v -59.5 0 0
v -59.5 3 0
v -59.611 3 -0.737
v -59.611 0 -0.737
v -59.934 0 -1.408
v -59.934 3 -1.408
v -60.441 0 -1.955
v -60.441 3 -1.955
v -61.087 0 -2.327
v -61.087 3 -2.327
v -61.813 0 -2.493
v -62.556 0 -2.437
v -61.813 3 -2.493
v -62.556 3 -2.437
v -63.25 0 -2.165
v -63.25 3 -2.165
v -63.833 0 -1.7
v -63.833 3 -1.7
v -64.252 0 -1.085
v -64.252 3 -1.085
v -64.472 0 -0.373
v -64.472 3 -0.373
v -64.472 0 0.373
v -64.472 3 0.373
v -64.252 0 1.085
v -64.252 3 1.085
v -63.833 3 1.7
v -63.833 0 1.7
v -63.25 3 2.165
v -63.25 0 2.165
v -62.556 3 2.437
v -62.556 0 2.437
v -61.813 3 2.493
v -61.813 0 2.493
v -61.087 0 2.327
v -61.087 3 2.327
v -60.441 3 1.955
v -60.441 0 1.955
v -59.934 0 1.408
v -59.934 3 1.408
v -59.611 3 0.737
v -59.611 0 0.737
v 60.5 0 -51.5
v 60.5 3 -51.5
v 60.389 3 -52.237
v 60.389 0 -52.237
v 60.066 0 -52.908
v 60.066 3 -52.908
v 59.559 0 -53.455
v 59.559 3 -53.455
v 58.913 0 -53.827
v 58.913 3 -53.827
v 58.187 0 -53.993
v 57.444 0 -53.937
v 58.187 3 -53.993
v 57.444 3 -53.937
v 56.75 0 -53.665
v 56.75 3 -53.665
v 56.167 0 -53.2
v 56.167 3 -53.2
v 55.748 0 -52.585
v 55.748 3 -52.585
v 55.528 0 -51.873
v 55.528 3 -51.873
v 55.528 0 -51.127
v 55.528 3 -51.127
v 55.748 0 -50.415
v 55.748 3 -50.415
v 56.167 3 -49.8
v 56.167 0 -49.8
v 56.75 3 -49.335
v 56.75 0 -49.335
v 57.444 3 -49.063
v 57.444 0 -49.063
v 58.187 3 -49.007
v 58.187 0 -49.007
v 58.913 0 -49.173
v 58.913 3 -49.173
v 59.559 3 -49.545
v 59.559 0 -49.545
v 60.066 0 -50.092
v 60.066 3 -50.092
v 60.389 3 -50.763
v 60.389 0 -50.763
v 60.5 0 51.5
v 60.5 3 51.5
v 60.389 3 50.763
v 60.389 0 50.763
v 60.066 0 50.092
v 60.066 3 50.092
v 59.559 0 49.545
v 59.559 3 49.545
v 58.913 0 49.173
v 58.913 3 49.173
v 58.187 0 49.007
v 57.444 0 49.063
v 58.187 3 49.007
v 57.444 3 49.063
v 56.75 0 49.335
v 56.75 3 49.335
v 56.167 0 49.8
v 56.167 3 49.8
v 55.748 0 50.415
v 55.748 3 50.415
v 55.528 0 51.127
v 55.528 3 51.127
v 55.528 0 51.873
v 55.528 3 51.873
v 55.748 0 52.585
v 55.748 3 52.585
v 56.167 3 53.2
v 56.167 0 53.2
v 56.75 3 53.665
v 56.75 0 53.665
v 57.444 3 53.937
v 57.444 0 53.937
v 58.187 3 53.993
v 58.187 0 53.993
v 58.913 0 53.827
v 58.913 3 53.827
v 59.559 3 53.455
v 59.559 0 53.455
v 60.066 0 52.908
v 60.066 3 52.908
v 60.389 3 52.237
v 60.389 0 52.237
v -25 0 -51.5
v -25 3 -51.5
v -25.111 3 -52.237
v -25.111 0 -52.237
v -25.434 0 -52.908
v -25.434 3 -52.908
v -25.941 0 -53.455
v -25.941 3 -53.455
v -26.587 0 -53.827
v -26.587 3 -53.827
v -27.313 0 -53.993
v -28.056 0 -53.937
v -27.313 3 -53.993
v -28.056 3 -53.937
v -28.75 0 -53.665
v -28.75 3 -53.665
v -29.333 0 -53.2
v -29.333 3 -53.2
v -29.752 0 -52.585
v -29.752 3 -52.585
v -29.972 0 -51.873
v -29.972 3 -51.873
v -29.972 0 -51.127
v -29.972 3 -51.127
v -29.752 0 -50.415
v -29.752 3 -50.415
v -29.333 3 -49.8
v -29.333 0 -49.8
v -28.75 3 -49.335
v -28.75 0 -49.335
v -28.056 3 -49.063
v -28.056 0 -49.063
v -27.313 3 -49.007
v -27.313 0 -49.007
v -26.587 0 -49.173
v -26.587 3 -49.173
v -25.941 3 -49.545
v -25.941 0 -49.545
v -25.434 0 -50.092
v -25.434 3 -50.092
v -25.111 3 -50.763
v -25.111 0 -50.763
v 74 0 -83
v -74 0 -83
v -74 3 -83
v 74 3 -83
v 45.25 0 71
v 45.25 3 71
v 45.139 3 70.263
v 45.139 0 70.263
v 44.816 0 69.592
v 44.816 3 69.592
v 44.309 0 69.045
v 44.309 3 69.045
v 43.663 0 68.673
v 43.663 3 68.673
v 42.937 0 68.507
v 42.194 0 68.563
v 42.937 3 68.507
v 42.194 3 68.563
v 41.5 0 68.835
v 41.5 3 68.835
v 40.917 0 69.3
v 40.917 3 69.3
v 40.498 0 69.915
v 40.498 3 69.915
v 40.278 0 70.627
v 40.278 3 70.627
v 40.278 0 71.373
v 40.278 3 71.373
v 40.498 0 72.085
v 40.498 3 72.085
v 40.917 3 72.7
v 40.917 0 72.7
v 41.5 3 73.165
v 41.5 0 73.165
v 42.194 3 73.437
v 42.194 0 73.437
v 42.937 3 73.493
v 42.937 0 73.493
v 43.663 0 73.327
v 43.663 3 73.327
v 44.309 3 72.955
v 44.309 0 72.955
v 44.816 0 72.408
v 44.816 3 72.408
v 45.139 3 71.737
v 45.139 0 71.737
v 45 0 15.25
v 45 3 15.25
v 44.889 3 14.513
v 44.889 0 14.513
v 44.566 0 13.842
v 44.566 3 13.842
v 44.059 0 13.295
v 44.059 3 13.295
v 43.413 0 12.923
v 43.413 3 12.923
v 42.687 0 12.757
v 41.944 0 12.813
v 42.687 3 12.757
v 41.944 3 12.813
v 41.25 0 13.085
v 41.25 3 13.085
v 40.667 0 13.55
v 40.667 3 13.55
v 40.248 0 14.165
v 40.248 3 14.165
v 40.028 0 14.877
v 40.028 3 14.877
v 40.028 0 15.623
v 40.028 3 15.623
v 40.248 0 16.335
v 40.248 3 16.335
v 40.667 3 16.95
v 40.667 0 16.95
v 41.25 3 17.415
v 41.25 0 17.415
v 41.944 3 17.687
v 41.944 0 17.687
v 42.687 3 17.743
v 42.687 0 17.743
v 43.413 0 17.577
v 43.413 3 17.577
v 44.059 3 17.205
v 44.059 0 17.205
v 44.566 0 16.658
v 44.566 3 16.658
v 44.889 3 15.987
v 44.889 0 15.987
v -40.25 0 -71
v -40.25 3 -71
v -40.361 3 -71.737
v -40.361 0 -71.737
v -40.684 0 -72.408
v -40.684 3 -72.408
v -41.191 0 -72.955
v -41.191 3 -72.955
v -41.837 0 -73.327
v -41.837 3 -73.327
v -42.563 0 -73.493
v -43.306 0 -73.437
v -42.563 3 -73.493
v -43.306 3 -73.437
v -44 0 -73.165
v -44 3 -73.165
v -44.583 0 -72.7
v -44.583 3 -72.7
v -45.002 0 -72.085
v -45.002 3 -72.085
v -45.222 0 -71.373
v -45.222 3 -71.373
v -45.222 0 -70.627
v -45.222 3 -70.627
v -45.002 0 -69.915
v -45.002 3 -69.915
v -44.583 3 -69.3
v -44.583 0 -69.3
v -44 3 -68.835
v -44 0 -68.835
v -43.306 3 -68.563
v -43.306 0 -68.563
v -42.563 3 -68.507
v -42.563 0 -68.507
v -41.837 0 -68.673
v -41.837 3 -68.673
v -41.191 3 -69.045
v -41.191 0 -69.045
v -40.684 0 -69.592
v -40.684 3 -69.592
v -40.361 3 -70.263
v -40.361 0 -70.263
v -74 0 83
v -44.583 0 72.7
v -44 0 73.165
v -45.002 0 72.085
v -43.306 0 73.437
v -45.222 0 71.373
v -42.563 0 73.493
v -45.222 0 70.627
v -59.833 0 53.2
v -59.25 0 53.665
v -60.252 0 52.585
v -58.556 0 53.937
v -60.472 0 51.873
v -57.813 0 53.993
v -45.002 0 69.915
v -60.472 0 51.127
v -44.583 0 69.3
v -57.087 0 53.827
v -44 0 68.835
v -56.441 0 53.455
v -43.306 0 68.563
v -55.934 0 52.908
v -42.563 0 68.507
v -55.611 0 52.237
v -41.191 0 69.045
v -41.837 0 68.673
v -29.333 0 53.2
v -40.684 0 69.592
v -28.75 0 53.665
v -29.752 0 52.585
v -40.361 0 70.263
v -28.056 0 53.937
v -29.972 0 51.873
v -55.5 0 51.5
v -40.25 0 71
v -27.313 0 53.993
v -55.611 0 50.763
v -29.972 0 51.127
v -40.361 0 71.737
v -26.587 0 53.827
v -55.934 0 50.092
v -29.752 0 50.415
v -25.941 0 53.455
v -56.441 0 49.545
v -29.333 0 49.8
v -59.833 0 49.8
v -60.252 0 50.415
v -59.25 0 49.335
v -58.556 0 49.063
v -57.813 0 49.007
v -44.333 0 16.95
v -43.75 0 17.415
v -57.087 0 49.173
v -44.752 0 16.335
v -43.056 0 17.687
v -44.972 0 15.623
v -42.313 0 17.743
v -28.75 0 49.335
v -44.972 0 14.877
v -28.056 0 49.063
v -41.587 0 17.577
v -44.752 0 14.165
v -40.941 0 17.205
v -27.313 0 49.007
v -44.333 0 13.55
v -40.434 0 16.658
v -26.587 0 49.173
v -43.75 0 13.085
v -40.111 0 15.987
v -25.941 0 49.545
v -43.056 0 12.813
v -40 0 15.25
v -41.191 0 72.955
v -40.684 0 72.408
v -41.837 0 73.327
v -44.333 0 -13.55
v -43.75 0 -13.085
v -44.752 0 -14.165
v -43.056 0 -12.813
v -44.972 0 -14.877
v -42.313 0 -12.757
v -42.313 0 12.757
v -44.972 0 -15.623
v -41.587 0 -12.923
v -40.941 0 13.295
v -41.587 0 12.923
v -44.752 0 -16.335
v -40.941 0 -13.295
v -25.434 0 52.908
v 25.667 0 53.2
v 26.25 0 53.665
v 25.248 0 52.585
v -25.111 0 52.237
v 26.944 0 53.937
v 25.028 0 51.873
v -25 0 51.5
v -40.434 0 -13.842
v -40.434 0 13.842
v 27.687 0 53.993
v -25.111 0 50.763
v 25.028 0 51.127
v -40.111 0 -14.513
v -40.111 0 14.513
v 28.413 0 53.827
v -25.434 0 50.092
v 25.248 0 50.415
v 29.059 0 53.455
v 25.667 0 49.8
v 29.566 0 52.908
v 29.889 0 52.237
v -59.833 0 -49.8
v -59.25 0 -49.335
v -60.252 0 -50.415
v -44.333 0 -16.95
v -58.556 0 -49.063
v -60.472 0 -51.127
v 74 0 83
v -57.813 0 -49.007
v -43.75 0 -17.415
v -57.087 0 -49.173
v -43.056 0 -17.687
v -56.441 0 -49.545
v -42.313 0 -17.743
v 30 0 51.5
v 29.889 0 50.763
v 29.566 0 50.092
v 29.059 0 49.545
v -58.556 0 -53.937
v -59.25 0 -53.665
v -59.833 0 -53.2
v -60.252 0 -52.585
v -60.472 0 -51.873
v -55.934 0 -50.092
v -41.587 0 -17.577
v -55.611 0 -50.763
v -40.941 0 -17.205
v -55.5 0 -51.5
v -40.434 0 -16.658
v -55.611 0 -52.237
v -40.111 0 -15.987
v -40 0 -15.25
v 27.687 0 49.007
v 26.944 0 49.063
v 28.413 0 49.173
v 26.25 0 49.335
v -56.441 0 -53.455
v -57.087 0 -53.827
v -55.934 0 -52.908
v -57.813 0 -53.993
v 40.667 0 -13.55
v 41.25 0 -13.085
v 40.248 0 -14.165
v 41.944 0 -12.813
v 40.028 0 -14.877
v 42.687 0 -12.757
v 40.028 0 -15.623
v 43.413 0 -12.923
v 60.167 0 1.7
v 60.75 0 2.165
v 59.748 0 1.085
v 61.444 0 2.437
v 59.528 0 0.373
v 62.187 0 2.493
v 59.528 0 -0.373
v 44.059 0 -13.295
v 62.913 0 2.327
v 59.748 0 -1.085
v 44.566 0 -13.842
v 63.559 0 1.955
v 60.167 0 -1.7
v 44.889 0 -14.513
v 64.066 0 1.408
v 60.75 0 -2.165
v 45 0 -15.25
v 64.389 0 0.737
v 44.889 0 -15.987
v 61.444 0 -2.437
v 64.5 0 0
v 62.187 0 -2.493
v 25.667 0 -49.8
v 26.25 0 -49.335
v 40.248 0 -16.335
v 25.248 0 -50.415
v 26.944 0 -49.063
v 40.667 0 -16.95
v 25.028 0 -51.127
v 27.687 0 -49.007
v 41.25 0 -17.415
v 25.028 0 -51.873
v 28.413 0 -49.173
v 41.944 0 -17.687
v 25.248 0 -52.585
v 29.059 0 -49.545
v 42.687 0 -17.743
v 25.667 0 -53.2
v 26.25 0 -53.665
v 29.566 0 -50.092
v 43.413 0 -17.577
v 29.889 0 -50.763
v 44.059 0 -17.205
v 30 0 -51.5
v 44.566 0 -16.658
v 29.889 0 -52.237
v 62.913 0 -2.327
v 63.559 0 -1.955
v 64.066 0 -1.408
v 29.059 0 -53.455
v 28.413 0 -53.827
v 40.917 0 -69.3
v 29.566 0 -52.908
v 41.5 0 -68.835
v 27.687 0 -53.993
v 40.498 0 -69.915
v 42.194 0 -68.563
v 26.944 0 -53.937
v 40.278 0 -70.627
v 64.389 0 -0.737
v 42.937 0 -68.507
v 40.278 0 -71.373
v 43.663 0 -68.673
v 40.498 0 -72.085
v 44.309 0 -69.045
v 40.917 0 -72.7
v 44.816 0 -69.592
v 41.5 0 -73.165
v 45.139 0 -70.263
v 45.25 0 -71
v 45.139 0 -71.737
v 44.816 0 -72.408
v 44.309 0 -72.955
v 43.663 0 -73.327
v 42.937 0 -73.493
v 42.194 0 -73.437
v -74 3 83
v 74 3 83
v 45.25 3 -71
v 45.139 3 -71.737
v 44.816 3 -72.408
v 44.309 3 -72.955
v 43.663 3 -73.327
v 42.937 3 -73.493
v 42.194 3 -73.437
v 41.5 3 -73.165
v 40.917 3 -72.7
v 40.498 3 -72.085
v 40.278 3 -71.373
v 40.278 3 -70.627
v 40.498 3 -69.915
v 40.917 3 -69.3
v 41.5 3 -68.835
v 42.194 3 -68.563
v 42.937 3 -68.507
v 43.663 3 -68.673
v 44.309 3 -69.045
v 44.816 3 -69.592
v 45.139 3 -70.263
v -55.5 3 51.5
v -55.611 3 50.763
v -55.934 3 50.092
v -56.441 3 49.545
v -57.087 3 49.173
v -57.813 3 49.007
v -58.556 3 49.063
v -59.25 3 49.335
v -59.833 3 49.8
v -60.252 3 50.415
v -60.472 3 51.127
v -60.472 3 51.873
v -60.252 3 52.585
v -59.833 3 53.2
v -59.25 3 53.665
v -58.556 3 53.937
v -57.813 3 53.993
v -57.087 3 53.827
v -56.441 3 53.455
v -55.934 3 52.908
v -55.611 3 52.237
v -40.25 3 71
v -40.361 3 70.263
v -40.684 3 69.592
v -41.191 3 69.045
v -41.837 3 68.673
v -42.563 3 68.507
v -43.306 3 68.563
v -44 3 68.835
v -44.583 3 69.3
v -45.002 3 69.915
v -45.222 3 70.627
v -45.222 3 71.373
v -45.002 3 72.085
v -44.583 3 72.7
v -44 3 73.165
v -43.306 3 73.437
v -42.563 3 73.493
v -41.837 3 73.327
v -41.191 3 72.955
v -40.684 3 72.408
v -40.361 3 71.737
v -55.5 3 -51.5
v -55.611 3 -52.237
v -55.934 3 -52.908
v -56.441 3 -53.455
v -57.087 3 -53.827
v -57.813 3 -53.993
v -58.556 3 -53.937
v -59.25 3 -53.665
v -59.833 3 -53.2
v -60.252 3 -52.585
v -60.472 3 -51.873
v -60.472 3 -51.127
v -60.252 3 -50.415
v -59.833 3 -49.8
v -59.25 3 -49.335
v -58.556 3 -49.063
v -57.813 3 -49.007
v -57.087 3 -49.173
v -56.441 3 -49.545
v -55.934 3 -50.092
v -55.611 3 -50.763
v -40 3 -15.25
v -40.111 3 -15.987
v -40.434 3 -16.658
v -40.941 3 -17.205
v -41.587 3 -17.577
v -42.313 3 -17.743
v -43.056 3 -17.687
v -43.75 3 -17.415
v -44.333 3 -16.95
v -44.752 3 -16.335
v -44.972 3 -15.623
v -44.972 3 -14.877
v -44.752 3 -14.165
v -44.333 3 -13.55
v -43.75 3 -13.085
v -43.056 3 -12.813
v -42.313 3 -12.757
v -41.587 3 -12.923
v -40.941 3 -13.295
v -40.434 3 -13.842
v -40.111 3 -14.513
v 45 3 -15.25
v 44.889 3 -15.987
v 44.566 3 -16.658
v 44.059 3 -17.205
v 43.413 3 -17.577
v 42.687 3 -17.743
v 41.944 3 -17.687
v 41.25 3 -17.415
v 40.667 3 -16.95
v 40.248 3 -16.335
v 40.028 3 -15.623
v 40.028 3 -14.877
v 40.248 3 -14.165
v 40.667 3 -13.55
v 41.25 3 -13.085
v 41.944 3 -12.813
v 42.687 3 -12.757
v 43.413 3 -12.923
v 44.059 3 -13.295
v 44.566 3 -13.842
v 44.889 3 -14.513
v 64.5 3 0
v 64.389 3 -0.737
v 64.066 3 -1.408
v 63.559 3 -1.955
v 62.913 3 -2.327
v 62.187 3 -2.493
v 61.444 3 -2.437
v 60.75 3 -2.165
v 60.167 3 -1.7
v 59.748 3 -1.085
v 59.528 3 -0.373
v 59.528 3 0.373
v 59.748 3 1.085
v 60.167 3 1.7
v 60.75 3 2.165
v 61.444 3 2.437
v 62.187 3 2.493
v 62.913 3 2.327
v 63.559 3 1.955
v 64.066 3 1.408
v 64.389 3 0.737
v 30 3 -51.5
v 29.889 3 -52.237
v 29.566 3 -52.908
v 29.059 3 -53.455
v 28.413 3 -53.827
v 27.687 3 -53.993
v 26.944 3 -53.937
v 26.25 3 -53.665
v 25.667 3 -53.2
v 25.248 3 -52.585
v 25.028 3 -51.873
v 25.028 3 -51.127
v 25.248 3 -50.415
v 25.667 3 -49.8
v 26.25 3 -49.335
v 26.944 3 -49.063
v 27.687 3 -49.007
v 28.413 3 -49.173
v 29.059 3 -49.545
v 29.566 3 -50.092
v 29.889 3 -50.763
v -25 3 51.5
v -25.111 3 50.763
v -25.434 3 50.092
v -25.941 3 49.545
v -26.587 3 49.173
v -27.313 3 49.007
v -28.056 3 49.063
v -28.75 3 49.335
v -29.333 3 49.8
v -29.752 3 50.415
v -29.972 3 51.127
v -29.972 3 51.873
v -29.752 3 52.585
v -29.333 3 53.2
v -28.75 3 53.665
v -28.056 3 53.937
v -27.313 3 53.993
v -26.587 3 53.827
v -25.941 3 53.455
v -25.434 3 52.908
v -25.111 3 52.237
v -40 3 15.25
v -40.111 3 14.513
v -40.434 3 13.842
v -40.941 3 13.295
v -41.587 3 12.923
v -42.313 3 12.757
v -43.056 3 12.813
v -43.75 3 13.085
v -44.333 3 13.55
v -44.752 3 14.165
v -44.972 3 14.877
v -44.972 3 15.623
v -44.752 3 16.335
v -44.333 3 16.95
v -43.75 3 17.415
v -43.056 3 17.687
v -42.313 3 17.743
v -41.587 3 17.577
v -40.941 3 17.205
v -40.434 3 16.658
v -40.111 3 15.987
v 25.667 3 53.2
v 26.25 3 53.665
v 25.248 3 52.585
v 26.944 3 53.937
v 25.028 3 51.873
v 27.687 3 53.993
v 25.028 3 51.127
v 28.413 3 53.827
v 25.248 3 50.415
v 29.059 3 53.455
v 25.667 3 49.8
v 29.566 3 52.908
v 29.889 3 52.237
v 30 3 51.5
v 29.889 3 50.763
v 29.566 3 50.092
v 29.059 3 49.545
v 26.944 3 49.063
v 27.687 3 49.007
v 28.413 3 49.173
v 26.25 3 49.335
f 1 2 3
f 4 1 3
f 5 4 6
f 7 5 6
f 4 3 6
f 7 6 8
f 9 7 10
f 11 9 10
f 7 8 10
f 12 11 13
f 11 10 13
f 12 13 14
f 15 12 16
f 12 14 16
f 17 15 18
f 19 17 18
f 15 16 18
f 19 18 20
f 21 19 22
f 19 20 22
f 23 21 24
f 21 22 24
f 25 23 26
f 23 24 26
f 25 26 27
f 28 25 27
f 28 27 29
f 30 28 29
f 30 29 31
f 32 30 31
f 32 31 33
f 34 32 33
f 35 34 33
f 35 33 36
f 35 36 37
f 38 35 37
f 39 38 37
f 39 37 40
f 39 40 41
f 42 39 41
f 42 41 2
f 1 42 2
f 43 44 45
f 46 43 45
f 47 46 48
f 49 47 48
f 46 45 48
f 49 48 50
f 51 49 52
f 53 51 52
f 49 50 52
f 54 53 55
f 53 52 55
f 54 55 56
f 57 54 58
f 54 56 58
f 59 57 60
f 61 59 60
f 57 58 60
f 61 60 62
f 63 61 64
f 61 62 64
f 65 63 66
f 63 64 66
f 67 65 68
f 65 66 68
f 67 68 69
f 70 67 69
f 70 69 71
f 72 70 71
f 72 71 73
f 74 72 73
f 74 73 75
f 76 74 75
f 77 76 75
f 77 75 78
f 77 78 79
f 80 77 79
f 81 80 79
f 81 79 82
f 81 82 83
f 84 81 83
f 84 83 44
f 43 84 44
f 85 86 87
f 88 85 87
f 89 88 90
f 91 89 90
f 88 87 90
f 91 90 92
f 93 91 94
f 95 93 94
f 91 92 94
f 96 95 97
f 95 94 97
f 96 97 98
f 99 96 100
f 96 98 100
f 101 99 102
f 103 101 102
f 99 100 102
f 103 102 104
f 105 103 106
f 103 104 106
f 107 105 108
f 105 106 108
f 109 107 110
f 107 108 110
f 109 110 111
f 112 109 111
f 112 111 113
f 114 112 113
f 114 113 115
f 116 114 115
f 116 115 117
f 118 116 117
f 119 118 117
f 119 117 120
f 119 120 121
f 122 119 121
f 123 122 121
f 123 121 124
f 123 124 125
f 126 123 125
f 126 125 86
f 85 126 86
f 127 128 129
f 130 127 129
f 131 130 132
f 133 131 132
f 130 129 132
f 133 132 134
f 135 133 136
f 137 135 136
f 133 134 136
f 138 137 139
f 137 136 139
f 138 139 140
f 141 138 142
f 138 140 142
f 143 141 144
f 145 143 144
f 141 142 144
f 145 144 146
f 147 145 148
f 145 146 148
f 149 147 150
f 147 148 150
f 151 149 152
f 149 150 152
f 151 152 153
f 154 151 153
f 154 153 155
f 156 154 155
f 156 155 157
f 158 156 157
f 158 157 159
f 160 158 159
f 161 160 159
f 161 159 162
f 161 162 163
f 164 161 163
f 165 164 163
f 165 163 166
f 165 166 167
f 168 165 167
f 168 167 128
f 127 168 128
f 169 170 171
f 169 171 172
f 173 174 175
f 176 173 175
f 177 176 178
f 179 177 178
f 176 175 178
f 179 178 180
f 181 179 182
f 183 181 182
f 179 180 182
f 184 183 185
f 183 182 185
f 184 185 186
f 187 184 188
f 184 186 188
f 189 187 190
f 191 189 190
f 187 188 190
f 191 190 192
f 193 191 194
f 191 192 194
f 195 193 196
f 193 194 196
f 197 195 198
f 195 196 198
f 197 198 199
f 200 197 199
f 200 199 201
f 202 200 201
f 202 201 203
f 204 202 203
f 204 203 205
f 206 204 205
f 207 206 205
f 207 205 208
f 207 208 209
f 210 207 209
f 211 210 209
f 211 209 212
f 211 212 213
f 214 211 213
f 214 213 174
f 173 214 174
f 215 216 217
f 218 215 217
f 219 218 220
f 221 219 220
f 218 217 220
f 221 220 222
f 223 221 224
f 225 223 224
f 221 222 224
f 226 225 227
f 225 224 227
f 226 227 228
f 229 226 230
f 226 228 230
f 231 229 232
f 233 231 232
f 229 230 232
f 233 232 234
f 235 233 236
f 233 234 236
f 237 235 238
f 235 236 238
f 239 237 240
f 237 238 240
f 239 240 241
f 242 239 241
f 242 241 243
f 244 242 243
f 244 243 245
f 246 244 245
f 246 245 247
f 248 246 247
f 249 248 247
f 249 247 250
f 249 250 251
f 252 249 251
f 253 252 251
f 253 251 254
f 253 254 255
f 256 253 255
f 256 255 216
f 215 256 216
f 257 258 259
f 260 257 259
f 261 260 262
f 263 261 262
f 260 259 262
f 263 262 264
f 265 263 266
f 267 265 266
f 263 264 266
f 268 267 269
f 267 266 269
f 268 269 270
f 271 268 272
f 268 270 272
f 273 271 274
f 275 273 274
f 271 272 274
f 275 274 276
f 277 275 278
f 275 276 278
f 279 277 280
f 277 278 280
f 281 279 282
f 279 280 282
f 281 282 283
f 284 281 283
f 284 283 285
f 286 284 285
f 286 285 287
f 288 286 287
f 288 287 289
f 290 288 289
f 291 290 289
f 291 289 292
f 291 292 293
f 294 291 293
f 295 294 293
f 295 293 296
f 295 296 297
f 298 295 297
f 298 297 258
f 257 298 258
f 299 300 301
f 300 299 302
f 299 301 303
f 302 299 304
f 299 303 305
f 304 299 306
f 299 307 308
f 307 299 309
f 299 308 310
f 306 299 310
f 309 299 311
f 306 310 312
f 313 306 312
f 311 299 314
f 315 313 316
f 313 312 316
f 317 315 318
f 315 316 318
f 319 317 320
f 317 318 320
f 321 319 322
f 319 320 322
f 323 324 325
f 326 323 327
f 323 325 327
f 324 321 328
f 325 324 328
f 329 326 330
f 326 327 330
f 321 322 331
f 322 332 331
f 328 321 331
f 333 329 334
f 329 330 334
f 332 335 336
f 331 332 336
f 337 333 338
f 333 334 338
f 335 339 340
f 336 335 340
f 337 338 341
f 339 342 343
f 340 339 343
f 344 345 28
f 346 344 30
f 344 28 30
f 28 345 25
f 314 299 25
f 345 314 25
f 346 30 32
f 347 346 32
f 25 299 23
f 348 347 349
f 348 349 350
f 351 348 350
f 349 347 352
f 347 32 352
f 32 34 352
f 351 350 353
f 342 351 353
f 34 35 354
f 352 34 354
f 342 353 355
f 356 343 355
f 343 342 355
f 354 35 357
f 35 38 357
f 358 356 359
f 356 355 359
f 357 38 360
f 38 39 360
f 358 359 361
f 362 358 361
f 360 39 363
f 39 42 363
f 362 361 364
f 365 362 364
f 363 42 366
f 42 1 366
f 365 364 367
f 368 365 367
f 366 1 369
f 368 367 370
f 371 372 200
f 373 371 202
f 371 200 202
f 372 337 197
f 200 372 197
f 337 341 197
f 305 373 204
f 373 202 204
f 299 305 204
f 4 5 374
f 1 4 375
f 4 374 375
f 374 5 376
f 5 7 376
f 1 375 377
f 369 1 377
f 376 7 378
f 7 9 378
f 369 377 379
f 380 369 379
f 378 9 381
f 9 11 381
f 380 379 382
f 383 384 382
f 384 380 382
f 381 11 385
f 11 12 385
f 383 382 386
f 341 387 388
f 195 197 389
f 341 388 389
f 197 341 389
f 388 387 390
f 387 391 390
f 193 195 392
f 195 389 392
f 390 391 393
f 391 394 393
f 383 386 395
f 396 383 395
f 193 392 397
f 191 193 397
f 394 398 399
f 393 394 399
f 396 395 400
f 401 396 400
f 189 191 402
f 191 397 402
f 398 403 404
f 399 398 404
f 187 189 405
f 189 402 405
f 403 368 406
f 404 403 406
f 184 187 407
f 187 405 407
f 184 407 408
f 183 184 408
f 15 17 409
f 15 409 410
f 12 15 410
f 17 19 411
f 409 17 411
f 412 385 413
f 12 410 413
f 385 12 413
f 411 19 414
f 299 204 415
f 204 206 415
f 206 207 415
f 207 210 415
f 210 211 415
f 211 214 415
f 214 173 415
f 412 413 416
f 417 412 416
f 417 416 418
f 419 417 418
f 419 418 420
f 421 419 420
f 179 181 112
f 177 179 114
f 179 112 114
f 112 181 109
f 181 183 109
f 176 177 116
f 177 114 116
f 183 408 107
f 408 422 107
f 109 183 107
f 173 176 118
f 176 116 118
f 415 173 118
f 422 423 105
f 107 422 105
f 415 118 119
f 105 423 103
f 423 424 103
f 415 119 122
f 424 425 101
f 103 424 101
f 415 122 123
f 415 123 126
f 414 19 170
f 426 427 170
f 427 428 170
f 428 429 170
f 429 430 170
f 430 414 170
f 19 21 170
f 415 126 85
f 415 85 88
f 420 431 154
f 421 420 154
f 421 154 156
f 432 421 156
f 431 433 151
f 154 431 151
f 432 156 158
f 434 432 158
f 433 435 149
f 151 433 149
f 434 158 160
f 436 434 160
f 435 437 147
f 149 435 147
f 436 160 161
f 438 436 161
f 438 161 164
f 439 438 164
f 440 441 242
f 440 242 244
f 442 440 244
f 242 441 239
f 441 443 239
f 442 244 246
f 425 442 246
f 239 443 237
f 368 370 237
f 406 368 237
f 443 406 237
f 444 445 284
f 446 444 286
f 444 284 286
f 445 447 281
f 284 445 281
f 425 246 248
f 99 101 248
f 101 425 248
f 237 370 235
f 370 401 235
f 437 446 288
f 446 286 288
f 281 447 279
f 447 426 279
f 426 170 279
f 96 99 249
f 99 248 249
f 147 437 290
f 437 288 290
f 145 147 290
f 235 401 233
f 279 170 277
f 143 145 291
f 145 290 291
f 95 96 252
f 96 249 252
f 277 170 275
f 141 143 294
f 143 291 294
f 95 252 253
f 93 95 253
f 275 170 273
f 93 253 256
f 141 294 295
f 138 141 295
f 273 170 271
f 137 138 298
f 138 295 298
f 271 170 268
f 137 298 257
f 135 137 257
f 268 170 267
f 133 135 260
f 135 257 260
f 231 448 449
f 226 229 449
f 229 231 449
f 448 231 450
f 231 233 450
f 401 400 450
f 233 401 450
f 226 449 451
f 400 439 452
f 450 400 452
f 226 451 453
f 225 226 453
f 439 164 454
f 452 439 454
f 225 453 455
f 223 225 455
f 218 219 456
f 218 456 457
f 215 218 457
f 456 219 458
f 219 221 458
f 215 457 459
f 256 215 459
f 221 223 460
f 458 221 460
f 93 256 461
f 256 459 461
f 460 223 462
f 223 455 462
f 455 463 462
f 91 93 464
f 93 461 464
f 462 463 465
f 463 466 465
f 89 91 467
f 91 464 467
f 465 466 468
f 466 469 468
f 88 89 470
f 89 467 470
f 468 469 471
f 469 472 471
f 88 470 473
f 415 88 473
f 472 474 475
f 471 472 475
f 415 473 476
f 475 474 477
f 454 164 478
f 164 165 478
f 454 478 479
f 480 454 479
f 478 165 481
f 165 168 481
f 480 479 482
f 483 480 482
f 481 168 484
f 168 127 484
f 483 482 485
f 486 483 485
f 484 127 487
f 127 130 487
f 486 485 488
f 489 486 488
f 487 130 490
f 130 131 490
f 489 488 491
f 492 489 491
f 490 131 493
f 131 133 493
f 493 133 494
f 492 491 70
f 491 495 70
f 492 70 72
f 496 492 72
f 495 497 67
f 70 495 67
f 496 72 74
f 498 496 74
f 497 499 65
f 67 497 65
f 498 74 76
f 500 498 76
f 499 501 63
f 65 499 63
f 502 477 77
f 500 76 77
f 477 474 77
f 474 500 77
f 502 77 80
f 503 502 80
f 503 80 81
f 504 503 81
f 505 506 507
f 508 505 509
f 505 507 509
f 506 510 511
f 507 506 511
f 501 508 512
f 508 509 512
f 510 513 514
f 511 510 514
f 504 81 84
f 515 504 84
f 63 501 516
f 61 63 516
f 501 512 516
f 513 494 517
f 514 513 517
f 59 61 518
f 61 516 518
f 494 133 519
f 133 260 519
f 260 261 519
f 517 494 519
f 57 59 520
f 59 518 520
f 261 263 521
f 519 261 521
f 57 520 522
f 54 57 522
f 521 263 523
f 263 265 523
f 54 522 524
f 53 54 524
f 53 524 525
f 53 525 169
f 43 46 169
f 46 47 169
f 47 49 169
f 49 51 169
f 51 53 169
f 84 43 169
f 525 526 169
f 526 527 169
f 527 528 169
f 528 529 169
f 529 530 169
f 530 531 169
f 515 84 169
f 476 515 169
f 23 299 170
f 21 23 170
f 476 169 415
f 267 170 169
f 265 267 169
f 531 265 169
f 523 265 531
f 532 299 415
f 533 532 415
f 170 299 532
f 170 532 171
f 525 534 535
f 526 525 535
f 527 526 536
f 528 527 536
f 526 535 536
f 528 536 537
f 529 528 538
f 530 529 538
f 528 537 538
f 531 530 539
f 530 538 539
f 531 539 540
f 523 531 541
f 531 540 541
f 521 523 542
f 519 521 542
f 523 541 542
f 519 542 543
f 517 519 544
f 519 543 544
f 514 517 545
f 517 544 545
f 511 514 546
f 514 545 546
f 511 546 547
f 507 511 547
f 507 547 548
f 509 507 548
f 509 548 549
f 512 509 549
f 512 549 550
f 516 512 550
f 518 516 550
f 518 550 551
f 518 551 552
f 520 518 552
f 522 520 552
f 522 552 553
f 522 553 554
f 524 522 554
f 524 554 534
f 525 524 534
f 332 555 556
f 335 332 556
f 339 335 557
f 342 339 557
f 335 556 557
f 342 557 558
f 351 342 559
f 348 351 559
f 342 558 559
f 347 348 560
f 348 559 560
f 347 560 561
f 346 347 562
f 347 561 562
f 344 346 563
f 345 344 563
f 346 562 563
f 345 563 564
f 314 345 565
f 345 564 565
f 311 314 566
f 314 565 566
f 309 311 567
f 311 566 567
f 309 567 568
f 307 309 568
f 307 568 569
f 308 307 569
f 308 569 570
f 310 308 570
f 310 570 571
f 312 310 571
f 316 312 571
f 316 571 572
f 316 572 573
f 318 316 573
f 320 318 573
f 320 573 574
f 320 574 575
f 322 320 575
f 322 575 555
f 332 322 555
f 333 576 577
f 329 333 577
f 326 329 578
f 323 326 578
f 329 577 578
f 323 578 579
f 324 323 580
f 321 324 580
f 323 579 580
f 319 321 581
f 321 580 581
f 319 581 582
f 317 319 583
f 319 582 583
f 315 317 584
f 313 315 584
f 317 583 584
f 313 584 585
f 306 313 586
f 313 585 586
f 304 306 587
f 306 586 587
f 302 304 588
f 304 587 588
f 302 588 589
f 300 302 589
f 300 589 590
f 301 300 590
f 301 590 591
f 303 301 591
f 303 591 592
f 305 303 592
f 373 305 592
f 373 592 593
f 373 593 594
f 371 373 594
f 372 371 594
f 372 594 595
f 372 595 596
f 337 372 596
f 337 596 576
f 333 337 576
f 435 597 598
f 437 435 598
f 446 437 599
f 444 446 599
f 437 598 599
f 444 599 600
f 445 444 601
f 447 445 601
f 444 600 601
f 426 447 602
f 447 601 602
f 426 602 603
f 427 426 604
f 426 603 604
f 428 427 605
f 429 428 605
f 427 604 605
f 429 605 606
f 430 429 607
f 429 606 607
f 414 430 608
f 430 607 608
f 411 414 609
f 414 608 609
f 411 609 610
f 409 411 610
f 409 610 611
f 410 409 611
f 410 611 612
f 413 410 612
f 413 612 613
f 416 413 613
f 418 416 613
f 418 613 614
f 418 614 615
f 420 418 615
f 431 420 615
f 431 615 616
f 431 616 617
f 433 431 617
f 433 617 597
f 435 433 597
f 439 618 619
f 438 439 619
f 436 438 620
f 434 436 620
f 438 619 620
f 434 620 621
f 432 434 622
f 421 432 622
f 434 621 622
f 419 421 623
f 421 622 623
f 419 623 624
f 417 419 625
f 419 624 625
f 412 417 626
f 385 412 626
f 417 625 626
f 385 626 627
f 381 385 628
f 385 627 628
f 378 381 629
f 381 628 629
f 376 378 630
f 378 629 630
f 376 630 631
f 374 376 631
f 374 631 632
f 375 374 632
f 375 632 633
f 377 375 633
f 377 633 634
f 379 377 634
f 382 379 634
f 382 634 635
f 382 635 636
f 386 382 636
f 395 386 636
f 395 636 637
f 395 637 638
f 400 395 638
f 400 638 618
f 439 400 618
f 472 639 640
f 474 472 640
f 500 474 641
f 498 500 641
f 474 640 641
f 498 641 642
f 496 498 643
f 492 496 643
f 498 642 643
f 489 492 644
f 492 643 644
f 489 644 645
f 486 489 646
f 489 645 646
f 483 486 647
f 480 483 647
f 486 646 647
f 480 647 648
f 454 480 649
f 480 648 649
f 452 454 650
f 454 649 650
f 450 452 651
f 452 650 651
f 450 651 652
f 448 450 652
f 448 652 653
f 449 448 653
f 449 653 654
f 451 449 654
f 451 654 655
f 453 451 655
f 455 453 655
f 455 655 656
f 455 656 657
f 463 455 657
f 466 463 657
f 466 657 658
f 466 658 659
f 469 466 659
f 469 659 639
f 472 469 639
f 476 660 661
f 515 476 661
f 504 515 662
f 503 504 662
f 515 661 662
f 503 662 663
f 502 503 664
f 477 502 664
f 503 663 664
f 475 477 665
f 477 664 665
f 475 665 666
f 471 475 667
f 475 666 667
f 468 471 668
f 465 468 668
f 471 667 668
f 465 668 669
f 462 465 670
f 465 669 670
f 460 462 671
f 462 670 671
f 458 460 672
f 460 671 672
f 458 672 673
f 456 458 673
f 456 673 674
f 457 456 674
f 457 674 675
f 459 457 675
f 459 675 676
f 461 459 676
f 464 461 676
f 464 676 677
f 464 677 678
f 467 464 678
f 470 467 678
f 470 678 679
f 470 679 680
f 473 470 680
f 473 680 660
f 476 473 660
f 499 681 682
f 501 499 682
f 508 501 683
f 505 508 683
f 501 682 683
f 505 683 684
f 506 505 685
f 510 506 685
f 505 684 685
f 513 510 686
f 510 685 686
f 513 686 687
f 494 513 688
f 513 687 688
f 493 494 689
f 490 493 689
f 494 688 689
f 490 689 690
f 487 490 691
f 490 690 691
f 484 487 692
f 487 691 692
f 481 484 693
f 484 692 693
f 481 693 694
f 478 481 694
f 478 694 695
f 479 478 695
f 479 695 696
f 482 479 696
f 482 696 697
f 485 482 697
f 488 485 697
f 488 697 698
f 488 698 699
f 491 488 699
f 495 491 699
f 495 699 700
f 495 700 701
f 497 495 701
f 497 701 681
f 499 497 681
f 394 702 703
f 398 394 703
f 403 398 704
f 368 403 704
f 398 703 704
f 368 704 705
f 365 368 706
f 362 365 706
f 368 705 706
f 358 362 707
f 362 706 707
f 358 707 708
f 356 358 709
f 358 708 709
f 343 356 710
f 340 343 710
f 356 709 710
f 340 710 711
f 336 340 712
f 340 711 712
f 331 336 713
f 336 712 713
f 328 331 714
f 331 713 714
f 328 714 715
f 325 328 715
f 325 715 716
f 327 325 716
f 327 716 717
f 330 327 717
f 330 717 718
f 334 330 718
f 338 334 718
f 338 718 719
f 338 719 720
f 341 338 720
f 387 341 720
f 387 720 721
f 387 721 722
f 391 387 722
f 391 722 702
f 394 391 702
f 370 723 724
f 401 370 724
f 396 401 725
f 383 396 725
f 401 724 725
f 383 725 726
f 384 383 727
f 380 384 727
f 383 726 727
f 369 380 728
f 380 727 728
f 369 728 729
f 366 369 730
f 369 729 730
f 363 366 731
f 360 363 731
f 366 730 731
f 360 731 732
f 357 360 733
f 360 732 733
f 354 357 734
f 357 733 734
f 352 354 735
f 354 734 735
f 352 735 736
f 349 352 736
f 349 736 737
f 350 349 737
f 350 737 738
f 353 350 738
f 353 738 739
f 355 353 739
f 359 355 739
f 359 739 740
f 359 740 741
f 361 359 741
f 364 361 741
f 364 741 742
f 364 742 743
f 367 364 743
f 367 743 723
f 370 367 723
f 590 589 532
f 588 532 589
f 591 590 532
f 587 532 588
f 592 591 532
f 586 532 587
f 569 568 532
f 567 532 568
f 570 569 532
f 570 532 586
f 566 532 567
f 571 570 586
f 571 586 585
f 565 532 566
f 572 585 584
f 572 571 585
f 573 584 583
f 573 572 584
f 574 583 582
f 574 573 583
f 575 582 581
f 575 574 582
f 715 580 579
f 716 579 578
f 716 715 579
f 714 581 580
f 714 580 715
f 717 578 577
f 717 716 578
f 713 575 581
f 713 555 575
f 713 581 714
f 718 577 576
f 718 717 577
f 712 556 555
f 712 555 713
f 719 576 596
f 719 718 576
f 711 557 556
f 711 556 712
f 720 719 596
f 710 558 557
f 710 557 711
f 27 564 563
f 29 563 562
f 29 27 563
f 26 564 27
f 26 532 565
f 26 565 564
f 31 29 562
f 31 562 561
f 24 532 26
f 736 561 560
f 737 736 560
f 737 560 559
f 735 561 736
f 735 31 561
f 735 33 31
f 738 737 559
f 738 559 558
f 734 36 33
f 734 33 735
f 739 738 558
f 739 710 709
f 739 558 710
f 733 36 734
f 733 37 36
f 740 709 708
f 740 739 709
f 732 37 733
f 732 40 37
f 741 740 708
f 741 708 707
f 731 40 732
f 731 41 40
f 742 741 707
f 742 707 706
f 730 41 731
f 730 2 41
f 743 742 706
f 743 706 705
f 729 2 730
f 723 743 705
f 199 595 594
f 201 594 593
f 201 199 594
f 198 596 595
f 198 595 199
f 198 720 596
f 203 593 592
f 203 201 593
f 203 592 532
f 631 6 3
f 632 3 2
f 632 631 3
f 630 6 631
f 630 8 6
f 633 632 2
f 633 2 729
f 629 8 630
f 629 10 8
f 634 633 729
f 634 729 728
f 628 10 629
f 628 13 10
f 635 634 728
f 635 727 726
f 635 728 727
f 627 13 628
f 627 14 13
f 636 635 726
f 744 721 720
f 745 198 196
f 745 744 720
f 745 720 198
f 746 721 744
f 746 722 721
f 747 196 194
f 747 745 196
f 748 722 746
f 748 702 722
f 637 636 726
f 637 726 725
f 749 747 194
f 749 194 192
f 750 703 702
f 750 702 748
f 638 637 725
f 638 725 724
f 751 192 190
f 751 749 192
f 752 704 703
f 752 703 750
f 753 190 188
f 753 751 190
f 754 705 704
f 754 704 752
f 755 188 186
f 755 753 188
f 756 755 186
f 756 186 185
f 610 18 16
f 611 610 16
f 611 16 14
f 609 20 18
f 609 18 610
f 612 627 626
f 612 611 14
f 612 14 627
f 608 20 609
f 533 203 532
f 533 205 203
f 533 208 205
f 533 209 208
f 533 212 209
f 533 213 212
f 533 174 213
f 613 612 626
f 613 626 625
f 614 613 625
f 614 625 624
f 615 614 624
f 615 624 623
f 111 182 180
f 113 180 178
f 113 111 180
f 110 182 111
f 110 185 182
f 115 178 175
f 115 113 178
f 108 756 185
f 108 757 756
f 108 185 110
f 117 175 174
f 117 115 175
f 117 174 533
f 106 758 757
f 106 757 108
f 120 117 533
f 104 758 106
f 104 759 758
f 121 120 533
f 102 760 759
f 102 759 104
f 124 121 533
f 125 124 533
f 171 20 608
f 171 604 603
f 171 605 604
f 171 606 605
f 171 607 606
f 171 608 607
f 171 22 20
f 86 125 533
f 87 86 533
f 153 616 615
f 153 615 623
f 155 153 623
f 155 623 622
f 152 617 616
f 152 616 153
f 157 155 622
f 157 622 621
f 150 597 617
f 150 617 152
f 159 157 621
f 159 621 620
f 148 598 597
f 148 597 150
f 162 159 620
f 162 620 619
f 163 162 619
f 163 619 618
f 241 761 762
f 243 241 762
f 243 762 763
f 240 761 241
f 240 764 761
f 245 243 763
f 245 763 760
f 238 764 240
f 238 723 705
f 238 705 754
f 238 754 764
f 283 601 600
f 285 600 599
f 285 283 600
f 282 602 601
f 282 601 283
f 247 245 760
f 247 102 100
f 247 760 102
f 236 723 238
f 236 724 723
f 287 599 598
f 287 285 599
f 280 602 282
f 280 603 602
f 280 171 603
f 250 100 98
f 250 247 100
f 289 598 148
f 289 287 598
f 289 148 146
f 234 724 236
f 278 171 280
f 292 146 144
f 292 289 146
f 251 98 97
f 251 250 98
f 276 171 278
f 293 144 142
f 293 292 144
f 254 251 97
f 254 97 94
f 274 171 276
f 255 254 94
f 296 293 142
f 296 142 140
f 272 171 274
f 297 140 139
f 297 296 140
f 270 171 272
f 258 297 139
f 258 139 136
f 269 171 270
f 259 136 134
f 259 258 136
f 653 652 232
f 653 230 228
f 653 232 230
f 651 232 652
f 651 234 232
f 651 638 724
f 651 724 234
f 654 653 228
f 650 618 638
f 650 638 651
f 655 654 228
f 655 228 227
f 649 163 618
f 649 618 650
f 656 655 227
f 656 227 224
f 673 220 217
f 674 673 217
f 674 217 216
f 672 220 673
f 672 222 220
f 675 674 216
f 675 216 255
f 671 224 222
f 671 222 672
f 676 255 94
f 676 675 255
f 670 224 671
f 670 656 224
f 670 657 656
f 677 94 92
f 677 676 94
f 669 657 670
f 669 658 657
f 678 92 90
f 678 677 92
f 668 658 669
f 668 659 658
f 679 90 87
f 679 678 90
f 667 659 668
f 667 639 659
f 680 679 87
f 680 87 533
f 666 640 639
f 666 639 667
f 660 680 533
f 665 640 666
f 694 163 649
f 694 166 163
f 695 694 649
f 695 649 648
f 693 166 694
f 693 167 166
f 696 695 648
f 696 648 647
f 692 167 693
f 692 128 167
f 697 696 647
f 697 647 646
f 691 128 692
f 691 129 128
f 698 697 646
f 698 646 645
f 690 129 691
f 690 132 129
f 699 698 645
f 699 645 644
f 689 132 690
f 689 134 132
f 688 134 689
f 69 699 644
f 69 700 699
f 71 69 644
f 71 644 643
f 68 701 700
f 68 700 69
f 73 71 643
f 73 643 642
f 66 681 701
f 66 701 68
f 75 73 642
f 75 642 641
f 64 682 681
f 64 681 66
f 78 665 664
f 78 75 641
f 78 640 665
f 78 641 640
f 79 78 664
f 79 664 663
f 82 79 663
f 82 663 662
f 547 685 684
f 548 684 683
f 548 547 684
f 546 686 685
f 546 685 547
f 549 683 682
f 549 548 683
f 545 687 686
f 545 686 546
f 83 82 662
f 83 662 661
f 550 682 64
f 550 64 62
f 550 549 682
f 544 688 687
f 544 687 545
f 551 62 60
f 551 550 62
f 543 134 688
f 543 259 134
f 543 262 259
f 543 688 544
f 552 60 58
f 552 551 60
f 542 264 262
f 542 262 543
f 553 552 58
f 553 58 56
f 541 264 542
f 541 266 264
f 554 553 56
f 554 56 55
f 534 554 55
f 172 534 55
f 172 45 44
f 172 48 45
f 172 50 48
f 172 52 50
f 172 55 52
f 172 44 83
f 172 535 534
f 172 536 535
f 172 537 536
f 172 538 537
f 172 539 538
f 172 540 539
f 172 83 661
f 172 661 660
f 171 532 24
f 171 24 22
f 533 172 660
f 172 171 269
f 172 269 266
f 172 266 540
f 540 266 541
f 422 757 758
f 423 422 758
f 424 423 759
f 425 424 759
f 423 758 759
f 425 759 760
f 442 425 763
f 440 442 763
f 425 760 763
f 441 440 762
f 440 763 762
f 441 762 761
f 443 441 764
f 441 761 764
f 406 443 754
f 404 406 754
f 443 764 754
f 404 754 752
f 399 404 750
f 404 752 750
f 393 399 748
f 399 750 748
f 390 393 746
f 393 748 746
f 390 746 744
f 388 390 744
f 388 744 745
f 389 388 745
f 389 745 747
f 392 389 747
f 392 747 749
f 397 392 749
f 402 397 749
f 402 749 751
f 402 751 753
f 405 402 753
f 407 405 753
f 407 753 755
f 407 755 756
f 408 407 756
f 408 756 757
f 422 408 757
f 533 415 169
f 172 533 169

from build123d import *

# Parameters (mm, degrees)
SKETCH_1_W          = 148
SKETCH_1_H          = 166
EXTRUDE_1_DEPTH     = 3
SKETCH_2_R          = 2.5
CUT_EXTRUDE_1_DEPTH = 4


with BuildPart() as part:
    # 草图1 → 凸台-拉伸1 (new body)
    with BuildSketch(Plane(origin=(0, 0, 0), x_dir=(1, 0, 0), z_dir=(0, 1, 0))):
        Rectangle(SKETCH_1_W, SKETCH_1_H)
    extrude(amount=EXTRUDE_1_DEPTH)

    # 草图2 → 切除-拉伸1 (cut, through all)
    with BuildSketch(Plane(origin=(0, 3, 0), x_dir=(1, 0, 0), z_dir=(0, 1, 0))):
        with Locations((-58, 51.5)):
            Circle(SKETCH_2_R)
        with Locations((-27.5, 51.5)):
            Circle(SKETCH_2_R)
        with Locations((-27.5, -51.5)):
            Circle(SKETCH_2_R)
        with Locations((-58, -51.5)):
            Circle(SKETCH_2_R)
        with Locations((58, -51.5)):
            Circle(SKETCH_2_R)
        with Locations((27.5, -51.5)):
            Circle(SKETCH_2_R)
        with Locations((27.5, 51.5)):
            Circle(SKETCH_2_R)
        with Locations((58, 51.5)):
            Circle(SKETCH_2_R)
        with Locations((-42.75, 71)):
            Circle(SKETCH_2_R)
        with Locations((-42.75, -71)):
            Circle(SKETCH_2_R)
        with Locations((42.75, -71)):
            Circle(SKETCH_2_R)
        with Locations((42.75, 71)):
            Circle(SKETCH_2_R)
        with Locations((-62, 0)):
            Circle(SKETCH_2_R)
        with Locations((-42.5, -15.25)):
            Circle(SKETCH_2_R)
        with Locations((-42.5, 15.25)):
            Circle(SKETCH_2_R)
        with Locations((42.5, 15.25)):
            Circle(SKETCH_2_R)
        with Locations((42.5, -15.25)):
            Circle(SKETCH_2_R)
        with Locations((62, 0)):
            Circle(SKETCH_2_R)
    extrude(amount=-CUT_EXTRUDE_1_DEPTH, mode=Mode.SUBTRACT)


solid = part.part
